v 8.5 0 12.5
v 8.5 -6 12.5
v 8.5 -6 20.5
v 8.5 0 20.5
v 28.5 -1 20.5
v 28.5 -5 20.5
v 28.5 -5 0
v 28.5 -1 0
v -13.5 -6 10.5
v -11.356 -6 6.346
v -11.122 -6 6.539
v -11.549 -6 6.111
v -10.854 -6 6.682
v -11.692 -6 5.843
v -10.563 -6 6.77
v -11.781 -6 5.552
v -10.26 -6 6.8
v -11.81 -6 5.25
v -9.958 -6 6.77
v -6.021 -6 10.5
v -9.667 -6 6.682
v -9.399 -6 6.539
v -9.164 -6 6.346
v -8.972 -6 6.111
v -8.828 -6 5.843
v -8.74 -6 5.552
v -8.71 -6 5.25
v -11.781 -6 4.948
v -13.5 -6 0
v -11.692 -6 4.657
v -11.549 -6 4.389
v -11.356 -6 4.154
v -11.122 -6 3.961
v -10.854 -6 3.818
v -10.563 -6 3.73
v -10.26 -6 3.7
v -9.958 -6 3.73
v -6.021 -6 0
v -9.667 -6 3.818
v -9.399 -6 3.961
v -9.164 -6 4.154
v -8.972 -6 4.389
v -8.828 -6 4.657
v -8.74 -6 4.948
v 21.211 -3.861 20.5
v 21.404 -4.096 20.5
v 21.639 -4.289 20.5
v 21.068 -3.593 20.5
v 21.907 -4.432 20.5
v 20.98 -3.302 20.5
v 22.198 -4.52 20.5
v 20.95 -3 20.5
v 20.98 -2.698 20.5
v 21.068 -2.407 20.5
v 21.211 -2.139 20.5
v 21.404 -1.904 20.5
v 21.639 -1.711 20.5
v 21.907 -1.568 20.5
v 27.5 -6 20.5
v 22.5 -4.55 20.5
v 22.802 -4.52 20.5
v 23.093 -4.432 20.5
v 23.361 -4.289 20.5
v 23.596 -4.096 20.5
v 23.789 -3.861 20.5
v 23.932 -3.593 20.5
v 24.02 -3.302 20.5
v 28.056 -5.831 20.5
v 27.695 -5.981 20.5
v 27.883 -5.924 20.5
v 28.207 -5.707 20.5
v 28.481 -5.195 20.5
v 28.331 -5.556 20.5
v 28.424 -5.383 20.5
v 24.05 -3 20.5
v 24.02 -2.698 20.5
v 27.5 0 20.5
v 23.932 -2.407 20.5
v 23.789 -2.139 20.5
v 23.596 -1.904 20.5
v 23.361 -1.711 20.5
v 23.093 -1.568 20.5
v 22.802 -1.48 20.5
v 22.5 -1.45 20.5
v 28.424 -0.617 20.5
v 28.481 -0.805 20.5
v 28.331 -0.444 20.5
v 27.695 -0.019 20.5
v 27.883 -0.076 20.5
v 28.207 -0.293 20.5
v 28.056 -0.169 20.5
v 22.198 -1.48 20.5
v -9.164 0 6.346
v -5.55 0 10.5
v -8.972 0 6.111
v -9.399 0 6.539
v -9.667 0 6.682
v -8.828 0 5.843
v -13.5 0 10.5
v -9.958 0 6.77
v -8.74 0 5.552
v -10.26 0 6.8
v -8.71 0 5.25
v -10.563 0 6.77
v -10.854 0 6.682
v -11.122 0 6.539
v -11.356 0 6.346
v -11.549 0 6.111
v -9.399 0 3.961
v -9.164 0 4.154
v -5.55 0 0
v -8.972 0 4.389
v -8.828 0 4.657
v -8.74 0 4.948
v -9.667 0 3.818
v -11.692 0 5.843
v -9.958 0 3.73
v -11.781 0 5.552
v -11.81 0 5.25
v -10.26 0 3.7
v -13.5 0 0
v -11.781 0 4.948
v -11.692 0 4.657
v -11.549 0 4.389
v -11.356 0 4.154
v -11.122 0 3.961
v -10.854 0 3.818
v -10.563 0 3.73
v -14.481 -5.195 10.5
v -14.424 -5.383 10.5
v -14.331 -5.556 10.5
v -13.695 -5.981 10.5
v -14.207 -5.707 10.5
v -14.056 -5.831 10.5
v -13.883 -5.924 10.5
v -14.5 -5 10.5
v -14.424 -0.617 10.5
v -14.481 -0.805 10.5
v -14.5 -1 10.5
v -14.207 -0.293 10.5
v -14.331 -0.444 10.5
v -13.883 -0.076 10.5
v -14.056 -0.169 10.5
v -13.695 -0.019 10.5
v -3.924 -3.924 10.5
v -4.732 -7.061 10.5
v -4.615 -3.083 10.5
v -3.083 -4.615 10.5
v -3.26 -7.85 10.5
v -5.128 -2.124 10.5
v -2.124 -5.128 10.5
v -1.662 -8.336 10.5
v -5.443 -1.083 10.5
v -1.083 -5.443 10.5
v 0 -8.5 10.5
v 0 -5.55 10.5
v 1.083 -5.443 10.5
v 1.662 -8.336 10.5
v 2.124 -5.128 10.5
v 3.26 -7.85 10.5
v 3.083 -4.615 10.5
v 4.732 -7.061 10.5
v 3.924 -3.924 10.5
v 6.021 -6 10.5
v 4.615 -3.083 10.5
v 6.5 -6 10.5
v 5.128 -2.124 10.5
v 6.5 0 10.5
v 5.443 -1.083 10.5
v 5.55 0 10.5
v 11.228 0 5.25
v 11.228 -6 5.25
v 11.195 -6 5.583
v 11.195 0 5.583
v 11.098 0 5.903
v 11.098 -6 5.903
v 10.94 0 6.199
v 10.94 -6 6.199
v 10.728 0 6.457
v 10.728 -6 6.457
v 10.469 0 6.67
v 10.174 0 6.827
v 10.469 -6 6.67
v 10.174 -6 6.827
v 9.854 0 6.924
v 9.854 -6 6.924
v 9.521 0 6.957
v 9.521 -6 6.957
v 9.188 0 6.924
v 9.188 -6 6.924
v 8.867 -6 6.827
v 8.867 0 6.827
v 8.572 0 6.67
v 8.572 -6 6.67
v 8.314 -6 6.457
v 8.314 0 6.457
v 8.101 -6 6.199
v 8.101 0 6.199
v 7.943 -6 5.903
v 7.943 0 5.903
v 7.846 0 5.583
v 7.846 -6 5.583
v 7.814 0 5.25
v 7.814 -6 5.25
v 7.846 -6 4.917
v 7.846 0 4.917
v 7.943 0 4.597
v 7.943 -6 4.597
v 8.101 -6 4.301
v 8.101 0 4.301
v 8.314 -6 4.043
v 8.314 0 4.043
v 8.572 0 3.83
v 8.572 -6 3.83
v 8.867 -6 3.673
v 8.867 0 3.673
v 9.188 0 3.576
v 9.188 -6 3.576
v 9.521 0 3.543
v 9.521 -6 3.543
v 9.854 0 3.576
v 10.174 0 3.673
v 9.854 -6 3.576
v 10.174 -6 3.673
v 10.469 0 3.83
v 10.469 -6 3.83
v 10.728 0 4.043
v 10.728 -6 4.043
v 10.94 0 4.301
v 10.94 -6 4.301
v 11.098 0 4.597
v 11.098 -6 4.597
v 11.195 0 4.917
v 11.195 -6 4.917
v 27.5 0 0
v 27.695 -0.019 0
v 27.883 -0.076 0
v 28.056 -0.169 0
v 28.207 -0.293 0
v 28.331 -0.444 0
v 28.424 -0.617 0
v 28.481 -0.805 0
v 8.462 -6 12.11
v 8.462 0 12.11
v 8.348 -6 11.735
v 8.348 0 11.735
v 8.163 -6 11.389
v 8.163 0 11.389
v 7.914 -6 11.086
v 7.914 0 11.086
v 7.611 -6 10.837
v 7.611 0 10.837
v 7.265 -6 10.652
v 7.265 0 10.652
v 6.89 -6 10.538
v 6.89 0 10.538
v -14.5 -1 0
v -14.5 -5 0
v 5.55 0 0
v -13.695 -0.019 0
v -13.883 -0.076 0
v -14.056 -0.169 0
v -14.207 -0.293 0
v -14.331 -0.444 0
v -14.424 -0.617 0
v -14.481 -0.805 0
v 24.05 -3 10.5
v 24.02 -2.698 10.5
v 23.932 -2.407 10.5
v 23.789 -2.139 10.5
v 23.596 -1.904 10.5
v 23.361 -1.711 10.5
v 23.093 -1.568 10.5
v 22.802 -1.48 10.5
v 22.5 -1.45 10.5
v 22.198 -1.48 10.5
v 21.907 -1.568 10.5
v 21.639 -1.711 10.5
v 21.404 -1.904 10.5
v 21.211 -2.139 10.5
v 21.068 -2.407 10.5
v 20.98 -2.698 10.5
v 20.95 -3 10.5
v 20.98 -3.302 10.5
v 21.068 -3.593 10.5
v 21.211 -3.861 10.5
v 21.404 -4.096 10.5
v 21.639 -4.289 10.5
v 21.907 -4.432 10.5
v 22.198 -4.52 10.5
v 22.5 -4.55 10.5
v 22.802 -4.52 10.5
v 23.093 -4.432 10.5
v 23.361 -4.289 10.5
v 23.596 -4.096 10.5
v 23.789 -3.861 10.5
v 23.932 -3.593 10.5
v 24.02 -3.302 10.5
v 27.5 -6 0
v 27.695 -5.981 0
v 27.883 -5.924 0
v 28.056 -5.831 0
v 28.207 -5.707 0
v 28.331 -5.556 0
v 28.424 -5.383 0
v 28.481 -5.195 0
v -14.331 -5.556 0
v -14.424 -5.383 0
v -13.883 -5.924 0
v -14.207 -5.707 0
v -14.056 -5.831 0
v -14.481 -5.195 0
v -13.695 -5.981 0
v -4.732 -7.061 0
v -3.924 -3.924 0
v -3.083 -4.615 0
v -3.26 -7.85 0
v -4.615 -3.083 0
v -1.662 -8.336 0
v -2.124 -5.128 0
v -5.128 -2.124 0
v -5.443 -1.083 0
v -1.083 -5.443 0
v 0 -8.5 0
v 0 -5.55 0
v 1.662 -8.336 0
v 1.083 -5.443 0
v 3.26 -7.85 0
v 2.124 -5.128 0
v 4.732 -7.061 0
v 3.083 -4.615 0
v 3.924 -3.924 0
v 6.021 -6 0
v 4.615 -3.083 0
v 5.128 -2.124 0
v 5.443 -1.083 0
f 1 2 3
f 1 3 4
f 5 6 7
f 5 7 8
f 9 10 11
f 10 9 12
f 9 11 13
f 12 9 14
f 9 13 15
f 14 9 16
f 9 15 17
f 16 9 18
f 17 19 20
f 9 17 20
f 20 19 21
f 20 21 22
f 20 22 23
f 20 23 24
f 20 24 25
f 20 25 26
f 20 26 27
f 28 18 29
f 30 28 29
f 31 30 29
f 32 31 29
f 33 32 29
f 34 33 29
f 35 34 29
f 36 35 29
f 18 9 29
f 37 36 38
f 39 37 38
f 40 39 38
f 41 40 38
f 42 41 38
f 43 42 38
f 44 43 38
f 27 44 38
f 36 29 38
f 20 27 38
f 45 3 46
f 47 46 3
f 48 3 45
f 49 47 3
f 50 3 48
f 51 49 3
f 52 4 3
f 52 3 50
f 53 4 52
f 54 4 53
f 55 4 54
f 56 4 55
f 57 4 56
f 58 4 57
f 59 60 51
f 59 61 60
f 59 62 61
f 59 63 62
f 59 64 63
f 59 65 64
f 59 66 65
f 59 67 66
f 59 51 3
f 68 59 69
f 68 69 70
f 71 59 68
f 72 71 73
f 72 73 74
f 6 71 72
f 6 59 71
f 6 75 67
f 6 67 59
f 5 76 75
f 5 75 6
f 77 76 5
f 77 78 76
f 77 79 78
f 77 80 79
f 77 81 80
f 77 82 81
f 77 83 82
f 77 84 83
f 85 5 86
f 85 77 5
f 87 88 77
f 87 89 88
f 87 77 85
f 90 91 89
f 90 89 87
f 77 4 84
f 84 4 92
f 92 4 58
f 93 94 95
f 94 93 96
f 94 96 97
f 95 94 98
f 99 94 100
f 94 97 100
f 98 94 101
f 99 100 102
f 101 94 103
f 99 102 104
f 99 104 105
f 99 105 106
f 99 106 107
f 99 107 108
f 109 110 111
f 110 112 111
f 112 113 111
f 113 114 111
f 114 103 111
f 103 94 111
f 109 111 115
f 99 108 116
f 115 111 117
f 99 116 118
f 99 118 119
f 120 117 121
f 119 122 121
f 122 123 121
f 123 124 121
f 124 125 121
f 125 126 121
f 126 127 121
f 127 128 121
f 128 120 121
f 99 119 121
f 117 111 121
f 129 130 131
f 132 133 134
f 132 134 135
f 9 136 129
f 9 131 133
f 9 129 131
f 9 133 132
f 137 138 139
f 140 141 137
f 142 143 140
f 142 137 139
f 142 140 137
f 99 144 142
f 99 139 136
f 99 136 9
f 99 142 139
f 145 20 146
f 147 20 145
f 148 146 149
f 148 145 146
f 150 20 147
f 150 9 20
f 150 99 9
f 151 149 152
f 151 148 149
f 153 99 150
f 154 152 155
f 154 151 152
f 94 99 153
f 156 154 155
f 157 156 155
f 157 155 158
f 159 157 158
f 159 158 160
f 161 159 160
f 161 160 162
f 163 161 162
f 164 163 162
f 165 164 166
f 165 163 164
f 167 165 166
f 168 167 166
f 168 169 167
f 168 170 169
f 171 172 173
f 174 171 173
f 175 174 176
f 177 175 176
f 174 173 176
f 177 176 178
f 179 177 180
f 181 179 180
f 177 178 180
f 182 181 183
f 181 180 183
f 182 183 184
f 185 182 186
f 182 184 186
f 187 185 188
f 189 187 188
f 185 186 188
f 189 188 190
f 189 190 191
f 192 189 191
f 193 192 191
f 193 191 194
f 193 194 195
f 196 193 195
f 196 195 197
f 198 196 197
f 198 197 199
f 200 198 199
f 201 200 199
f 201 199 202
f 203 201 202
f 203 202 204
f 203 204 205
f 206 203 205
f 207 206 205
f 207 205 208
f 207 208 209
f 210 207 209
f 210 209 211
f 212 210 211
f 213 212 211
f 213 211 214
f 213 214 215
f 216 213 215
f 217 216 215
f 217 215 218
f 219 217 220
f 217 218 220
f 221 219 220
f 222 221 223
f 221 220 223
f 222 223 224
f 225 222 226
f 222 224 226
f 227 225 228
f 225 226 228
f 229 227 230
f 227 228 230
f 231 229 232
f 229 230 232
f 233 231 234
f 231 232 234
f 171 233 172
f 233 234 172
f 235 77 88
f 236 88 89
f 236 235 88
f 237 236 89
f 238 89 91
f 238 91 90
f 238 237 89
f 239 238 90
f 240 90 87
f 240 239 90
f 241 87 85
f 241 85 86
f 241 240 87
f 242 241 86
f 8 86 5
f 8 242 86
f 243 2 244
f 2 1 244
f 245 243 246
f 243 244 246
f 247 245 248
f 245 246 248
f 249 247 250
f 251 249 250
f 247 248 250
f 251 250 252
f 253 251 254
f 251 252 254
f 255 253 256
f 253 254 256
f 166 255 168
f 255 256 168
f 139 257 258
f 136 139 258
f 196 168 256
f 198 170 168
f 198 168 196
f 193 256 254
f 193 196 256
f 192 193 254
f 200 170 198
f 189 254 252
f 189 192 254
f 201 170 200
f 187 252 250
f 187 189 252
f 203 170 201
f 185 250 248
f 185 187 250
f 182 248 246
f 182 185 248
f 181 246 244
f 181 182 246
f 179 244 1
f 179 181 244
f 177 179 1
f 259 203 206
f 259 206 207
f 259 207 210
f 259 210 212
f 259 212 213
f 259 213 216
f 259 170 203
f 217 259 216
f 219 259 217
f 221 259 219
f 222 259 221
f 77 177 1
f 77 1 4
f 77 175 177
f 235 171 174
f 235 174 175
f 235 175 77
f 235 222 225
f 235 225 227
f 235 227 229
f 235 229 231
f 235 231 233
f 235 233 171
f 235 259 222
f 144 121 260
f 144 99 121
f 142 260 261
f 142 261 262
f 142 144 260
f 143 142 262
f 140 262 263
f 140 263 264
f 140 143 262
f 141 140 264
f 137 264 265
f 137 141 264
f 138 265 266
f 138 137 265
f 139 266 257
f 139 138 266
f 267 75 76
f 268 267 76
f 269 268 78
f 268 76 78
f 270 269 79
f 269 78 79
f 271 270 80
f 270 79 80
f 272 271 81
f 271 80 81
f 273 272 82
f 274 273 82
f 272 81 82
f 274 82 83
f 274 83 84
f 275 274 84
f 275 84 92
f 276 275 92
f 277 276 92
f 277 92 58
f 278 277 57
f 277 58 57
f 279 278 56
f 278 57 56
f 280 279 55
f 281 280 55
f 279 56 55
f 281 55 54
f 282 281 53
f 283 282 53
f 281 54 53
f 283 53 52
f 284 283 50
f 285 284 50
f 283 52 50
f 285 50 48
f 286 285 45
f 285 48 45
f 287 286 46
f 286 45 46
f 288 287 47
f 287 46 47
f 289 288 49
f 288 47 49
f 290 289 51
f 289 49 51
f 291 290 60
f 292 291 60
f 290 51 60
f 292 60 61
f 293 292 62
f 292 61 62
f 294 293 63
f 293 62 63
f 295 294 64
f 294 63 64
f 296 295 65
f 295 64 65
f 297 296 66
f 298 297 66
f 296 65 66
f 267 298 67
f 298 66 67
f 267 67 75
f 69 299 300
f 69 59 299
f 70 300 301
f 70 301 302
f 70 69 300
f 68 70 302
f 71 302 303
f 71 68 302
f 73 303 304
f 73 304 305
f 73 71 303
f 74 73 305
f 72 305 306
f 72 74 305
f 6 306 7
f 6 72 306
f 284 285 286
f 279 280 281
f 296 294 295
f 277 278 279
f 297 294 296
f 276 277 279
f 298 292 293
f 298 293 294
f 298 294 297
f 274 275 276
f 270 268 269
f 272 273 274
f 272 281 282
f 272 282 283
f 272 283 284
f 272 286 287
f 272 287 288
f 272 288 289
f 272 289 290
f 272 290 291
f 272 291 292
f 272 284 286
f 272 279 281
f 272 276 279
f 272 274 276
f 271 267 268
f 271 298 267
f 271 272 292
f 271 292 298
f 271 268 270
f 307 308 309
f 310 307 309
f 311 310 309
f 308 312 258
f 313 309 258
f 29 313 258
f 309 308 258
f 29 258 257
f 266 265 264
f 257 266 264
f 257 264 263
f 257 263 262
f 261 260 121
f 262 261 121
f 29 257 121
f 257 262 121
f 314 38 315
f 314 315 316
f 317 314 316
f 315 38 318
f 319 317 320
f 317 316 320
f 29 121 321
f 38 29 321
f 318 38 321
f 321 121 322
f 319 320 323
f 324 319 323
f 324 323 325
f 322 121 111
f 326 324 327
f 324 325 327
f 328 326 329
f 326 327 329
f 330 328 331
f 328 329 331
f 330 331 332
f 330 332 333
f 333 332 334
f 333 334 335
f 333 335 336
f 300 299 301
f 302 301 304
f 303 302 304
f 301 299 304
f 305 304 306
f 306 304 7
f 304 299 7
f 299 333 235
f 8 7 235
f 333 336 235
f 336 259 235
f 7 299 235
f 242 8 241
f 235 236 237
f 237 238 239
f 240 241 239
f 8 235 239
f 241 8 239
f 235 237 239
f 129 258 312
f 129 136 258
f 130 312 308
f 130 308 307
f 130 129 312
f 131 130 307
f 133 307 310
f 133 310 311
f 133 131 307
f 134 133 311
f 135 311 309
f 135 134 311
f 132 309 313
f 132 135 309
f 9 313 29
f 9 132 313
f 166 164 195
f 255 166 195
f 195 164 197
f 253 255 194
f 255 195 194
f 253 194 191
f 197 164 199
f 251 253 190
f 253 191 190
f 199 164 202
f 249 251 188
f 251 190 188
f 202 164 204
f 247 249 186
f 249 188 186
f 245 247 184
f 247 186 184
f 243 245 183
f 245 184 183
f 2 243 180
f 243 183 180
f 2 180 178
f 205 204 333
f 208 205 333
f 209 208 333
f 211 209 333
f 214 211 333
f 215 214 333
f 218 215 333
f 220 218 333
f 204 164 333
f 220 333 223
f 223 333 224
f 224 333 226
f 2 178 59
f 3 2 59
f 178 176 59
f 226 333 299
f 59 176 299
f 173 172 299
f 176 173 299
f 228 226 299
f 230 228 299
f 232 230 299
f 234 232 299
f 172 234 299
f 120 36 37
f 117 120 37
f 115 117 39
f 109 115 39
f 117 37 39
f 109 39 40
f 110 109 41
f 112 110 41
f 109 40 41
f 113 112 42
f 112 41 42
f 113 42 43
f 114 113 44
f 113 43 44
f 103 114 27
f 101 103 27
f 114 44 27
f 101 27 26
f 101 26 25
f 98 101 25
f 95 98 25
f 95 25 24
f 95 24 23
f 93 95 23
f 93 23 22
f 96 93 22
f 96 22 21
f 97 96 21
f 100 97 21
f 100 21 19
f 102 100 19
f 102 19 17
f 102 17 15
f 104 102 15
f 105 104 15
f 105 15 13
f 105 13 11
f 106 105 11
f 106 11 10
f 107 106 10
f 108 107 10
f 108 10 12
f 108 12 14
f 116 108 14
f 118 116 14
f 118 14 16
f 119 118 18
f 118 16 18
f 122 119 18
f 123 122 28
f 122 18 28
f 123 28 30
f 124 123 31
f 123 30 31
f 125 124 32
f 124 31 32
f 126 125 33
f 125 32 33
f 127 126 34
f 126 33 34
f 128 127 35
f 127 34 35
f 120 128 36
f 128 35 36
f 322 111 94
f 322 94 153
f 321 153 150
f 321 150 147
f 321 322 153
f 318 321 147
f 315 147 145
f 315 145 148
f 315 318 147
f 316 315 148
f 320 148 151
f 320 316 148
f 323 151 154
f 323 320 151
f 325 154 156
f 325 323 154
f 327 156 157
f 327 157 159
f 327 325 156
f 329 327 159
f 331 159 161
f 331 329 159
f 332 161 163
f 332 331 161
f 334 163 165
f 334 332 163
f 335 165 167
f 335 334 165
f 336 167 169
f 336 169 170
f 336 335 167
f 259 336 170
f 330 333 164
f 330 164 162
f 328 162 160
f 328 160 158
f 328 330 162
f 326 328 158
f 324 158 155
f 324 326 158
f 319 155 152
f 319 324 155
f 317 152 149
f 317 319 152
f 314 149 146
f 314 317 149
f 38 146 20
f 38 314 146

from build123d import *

# Parameters (mm, degrees)
EXTRUDE_1_DEPTH     = 10.5
SKETCH_2_R          = 1.55
CUT_EXTRUDE_1_DEPTH = 31.959651161
SKETCH_3_R          = 1.70728631
CUT_EXTRUDE_2_DEPTH = 31.959651161
SKETCH_5_W          = 20
SKETCH_5_H          = 6
EXTRUDE_2_DEPTH     = 10
SKETCH_6_R          = 1.55
CUT_EXTRUDE_4_DEPTH = 10
FILLET_1_R          = 2
FILLET_2_R          = 1


with BuildPart() as part:
    # 草图1 → 凸台-拉伸1 (new body)
    with BuildSketch(Plane.XY):
        with BuildLine():
            ThreePointArc((-6.020797289, -6), (-7.855786942, -3.246014713), (-8.5, 0))
            Line((-8.5, 0), (-14.5, 0))
            Line((-14.5, 0), (-14.5, -6))
            Line((-14.5, -6), (-6.020797289, -6))
        make_face()
        with BuildLine():
            Line((-8.5, 0), (-5.55, 0))
            ThreePointArc((-5.55, 0), (0, -5.55), (5.55, 0))
            Line((5.55, 0), (8.5, 0))
            ThreePointArc((8.5, 0), (0, -8.5), (-8.5, 0))
        make_face()
        with BuildLine():
            ThreePointArc((8.5, 0), (7.855786942, -3.246014713), (6.020797289, -6))
            Line((6.020797289, -6), (28.5, -6))
            Line((28.5, -6), (28.5, 0))
            Line((28.5, 0), (8.5, 0))
        make_face()
    extrude(amount=EXTRUDE_1_DEPTH)

    # 草图2 → 切除-拉伸1 (cut, through all)
    with BuildSketch(Plane.XZ.offset(6)):
        with Locations(Location((-10.260398645, 5.25, 0), (0, 0, 270))):
            Circle(SKETCH_2_R)
    extrude(amount=-CUT_EXTRUDE_1_DEPTH, mode=Mode.SUBTRACT)

    # 草图3 → 切除-拉伸2 (cut, through all)
    with BuildSketch(Plane.XZ.offset(6)):
        with Locations((9.520797289, 5.25)):
            Circle(SKETCH_3_R)
    extrude(amount=-CUT_EXTRUDE_2_DEPTH, mode=Mode.SUBTRACT)

    # 草图5 → 凸台-拉伸2 (add)
    with BuildSketch(Plane.XY.offset(10.5)):
        with Locations((18.5, -3)):
            Rectangle(SKETCH_5_W, SKETCH_5_H)
    extrude(amount=EXTRUDE_2_DEPTH)

    # 草图6 → 切除-拉伸4 (cut)
    with BuildSketch(Plane.XY.offset(20.5)):
        with Locations((22.5, -3)):
            Circle(SKETCH_6_R)
    extrude(amount=-CUT_EXTRUDE_4_DEPTH, mode=Mode.SUBTRACT)

    # 圆角1
    fillet_1_edges = [part.edges().sort_by_distance(p)[0] for p in [
        (8.5, -3, 10.5),
    ]]
    fillet(fillet_1_edges, radius=FILLET_1_R)

    # 圆角2
    fillet_2_edges = [part.edges().sort_by_distance(p)[0] for p in [
        (-14.5, -6, 5.25),
        (-14.5, 0, 5.25),
        (28.5, 0, 10.25),
        (28.5, -6, 10.25),
    ]]
    fillet(fillet_2_edges, radius=FILLET_2_R)


solid = part.part
